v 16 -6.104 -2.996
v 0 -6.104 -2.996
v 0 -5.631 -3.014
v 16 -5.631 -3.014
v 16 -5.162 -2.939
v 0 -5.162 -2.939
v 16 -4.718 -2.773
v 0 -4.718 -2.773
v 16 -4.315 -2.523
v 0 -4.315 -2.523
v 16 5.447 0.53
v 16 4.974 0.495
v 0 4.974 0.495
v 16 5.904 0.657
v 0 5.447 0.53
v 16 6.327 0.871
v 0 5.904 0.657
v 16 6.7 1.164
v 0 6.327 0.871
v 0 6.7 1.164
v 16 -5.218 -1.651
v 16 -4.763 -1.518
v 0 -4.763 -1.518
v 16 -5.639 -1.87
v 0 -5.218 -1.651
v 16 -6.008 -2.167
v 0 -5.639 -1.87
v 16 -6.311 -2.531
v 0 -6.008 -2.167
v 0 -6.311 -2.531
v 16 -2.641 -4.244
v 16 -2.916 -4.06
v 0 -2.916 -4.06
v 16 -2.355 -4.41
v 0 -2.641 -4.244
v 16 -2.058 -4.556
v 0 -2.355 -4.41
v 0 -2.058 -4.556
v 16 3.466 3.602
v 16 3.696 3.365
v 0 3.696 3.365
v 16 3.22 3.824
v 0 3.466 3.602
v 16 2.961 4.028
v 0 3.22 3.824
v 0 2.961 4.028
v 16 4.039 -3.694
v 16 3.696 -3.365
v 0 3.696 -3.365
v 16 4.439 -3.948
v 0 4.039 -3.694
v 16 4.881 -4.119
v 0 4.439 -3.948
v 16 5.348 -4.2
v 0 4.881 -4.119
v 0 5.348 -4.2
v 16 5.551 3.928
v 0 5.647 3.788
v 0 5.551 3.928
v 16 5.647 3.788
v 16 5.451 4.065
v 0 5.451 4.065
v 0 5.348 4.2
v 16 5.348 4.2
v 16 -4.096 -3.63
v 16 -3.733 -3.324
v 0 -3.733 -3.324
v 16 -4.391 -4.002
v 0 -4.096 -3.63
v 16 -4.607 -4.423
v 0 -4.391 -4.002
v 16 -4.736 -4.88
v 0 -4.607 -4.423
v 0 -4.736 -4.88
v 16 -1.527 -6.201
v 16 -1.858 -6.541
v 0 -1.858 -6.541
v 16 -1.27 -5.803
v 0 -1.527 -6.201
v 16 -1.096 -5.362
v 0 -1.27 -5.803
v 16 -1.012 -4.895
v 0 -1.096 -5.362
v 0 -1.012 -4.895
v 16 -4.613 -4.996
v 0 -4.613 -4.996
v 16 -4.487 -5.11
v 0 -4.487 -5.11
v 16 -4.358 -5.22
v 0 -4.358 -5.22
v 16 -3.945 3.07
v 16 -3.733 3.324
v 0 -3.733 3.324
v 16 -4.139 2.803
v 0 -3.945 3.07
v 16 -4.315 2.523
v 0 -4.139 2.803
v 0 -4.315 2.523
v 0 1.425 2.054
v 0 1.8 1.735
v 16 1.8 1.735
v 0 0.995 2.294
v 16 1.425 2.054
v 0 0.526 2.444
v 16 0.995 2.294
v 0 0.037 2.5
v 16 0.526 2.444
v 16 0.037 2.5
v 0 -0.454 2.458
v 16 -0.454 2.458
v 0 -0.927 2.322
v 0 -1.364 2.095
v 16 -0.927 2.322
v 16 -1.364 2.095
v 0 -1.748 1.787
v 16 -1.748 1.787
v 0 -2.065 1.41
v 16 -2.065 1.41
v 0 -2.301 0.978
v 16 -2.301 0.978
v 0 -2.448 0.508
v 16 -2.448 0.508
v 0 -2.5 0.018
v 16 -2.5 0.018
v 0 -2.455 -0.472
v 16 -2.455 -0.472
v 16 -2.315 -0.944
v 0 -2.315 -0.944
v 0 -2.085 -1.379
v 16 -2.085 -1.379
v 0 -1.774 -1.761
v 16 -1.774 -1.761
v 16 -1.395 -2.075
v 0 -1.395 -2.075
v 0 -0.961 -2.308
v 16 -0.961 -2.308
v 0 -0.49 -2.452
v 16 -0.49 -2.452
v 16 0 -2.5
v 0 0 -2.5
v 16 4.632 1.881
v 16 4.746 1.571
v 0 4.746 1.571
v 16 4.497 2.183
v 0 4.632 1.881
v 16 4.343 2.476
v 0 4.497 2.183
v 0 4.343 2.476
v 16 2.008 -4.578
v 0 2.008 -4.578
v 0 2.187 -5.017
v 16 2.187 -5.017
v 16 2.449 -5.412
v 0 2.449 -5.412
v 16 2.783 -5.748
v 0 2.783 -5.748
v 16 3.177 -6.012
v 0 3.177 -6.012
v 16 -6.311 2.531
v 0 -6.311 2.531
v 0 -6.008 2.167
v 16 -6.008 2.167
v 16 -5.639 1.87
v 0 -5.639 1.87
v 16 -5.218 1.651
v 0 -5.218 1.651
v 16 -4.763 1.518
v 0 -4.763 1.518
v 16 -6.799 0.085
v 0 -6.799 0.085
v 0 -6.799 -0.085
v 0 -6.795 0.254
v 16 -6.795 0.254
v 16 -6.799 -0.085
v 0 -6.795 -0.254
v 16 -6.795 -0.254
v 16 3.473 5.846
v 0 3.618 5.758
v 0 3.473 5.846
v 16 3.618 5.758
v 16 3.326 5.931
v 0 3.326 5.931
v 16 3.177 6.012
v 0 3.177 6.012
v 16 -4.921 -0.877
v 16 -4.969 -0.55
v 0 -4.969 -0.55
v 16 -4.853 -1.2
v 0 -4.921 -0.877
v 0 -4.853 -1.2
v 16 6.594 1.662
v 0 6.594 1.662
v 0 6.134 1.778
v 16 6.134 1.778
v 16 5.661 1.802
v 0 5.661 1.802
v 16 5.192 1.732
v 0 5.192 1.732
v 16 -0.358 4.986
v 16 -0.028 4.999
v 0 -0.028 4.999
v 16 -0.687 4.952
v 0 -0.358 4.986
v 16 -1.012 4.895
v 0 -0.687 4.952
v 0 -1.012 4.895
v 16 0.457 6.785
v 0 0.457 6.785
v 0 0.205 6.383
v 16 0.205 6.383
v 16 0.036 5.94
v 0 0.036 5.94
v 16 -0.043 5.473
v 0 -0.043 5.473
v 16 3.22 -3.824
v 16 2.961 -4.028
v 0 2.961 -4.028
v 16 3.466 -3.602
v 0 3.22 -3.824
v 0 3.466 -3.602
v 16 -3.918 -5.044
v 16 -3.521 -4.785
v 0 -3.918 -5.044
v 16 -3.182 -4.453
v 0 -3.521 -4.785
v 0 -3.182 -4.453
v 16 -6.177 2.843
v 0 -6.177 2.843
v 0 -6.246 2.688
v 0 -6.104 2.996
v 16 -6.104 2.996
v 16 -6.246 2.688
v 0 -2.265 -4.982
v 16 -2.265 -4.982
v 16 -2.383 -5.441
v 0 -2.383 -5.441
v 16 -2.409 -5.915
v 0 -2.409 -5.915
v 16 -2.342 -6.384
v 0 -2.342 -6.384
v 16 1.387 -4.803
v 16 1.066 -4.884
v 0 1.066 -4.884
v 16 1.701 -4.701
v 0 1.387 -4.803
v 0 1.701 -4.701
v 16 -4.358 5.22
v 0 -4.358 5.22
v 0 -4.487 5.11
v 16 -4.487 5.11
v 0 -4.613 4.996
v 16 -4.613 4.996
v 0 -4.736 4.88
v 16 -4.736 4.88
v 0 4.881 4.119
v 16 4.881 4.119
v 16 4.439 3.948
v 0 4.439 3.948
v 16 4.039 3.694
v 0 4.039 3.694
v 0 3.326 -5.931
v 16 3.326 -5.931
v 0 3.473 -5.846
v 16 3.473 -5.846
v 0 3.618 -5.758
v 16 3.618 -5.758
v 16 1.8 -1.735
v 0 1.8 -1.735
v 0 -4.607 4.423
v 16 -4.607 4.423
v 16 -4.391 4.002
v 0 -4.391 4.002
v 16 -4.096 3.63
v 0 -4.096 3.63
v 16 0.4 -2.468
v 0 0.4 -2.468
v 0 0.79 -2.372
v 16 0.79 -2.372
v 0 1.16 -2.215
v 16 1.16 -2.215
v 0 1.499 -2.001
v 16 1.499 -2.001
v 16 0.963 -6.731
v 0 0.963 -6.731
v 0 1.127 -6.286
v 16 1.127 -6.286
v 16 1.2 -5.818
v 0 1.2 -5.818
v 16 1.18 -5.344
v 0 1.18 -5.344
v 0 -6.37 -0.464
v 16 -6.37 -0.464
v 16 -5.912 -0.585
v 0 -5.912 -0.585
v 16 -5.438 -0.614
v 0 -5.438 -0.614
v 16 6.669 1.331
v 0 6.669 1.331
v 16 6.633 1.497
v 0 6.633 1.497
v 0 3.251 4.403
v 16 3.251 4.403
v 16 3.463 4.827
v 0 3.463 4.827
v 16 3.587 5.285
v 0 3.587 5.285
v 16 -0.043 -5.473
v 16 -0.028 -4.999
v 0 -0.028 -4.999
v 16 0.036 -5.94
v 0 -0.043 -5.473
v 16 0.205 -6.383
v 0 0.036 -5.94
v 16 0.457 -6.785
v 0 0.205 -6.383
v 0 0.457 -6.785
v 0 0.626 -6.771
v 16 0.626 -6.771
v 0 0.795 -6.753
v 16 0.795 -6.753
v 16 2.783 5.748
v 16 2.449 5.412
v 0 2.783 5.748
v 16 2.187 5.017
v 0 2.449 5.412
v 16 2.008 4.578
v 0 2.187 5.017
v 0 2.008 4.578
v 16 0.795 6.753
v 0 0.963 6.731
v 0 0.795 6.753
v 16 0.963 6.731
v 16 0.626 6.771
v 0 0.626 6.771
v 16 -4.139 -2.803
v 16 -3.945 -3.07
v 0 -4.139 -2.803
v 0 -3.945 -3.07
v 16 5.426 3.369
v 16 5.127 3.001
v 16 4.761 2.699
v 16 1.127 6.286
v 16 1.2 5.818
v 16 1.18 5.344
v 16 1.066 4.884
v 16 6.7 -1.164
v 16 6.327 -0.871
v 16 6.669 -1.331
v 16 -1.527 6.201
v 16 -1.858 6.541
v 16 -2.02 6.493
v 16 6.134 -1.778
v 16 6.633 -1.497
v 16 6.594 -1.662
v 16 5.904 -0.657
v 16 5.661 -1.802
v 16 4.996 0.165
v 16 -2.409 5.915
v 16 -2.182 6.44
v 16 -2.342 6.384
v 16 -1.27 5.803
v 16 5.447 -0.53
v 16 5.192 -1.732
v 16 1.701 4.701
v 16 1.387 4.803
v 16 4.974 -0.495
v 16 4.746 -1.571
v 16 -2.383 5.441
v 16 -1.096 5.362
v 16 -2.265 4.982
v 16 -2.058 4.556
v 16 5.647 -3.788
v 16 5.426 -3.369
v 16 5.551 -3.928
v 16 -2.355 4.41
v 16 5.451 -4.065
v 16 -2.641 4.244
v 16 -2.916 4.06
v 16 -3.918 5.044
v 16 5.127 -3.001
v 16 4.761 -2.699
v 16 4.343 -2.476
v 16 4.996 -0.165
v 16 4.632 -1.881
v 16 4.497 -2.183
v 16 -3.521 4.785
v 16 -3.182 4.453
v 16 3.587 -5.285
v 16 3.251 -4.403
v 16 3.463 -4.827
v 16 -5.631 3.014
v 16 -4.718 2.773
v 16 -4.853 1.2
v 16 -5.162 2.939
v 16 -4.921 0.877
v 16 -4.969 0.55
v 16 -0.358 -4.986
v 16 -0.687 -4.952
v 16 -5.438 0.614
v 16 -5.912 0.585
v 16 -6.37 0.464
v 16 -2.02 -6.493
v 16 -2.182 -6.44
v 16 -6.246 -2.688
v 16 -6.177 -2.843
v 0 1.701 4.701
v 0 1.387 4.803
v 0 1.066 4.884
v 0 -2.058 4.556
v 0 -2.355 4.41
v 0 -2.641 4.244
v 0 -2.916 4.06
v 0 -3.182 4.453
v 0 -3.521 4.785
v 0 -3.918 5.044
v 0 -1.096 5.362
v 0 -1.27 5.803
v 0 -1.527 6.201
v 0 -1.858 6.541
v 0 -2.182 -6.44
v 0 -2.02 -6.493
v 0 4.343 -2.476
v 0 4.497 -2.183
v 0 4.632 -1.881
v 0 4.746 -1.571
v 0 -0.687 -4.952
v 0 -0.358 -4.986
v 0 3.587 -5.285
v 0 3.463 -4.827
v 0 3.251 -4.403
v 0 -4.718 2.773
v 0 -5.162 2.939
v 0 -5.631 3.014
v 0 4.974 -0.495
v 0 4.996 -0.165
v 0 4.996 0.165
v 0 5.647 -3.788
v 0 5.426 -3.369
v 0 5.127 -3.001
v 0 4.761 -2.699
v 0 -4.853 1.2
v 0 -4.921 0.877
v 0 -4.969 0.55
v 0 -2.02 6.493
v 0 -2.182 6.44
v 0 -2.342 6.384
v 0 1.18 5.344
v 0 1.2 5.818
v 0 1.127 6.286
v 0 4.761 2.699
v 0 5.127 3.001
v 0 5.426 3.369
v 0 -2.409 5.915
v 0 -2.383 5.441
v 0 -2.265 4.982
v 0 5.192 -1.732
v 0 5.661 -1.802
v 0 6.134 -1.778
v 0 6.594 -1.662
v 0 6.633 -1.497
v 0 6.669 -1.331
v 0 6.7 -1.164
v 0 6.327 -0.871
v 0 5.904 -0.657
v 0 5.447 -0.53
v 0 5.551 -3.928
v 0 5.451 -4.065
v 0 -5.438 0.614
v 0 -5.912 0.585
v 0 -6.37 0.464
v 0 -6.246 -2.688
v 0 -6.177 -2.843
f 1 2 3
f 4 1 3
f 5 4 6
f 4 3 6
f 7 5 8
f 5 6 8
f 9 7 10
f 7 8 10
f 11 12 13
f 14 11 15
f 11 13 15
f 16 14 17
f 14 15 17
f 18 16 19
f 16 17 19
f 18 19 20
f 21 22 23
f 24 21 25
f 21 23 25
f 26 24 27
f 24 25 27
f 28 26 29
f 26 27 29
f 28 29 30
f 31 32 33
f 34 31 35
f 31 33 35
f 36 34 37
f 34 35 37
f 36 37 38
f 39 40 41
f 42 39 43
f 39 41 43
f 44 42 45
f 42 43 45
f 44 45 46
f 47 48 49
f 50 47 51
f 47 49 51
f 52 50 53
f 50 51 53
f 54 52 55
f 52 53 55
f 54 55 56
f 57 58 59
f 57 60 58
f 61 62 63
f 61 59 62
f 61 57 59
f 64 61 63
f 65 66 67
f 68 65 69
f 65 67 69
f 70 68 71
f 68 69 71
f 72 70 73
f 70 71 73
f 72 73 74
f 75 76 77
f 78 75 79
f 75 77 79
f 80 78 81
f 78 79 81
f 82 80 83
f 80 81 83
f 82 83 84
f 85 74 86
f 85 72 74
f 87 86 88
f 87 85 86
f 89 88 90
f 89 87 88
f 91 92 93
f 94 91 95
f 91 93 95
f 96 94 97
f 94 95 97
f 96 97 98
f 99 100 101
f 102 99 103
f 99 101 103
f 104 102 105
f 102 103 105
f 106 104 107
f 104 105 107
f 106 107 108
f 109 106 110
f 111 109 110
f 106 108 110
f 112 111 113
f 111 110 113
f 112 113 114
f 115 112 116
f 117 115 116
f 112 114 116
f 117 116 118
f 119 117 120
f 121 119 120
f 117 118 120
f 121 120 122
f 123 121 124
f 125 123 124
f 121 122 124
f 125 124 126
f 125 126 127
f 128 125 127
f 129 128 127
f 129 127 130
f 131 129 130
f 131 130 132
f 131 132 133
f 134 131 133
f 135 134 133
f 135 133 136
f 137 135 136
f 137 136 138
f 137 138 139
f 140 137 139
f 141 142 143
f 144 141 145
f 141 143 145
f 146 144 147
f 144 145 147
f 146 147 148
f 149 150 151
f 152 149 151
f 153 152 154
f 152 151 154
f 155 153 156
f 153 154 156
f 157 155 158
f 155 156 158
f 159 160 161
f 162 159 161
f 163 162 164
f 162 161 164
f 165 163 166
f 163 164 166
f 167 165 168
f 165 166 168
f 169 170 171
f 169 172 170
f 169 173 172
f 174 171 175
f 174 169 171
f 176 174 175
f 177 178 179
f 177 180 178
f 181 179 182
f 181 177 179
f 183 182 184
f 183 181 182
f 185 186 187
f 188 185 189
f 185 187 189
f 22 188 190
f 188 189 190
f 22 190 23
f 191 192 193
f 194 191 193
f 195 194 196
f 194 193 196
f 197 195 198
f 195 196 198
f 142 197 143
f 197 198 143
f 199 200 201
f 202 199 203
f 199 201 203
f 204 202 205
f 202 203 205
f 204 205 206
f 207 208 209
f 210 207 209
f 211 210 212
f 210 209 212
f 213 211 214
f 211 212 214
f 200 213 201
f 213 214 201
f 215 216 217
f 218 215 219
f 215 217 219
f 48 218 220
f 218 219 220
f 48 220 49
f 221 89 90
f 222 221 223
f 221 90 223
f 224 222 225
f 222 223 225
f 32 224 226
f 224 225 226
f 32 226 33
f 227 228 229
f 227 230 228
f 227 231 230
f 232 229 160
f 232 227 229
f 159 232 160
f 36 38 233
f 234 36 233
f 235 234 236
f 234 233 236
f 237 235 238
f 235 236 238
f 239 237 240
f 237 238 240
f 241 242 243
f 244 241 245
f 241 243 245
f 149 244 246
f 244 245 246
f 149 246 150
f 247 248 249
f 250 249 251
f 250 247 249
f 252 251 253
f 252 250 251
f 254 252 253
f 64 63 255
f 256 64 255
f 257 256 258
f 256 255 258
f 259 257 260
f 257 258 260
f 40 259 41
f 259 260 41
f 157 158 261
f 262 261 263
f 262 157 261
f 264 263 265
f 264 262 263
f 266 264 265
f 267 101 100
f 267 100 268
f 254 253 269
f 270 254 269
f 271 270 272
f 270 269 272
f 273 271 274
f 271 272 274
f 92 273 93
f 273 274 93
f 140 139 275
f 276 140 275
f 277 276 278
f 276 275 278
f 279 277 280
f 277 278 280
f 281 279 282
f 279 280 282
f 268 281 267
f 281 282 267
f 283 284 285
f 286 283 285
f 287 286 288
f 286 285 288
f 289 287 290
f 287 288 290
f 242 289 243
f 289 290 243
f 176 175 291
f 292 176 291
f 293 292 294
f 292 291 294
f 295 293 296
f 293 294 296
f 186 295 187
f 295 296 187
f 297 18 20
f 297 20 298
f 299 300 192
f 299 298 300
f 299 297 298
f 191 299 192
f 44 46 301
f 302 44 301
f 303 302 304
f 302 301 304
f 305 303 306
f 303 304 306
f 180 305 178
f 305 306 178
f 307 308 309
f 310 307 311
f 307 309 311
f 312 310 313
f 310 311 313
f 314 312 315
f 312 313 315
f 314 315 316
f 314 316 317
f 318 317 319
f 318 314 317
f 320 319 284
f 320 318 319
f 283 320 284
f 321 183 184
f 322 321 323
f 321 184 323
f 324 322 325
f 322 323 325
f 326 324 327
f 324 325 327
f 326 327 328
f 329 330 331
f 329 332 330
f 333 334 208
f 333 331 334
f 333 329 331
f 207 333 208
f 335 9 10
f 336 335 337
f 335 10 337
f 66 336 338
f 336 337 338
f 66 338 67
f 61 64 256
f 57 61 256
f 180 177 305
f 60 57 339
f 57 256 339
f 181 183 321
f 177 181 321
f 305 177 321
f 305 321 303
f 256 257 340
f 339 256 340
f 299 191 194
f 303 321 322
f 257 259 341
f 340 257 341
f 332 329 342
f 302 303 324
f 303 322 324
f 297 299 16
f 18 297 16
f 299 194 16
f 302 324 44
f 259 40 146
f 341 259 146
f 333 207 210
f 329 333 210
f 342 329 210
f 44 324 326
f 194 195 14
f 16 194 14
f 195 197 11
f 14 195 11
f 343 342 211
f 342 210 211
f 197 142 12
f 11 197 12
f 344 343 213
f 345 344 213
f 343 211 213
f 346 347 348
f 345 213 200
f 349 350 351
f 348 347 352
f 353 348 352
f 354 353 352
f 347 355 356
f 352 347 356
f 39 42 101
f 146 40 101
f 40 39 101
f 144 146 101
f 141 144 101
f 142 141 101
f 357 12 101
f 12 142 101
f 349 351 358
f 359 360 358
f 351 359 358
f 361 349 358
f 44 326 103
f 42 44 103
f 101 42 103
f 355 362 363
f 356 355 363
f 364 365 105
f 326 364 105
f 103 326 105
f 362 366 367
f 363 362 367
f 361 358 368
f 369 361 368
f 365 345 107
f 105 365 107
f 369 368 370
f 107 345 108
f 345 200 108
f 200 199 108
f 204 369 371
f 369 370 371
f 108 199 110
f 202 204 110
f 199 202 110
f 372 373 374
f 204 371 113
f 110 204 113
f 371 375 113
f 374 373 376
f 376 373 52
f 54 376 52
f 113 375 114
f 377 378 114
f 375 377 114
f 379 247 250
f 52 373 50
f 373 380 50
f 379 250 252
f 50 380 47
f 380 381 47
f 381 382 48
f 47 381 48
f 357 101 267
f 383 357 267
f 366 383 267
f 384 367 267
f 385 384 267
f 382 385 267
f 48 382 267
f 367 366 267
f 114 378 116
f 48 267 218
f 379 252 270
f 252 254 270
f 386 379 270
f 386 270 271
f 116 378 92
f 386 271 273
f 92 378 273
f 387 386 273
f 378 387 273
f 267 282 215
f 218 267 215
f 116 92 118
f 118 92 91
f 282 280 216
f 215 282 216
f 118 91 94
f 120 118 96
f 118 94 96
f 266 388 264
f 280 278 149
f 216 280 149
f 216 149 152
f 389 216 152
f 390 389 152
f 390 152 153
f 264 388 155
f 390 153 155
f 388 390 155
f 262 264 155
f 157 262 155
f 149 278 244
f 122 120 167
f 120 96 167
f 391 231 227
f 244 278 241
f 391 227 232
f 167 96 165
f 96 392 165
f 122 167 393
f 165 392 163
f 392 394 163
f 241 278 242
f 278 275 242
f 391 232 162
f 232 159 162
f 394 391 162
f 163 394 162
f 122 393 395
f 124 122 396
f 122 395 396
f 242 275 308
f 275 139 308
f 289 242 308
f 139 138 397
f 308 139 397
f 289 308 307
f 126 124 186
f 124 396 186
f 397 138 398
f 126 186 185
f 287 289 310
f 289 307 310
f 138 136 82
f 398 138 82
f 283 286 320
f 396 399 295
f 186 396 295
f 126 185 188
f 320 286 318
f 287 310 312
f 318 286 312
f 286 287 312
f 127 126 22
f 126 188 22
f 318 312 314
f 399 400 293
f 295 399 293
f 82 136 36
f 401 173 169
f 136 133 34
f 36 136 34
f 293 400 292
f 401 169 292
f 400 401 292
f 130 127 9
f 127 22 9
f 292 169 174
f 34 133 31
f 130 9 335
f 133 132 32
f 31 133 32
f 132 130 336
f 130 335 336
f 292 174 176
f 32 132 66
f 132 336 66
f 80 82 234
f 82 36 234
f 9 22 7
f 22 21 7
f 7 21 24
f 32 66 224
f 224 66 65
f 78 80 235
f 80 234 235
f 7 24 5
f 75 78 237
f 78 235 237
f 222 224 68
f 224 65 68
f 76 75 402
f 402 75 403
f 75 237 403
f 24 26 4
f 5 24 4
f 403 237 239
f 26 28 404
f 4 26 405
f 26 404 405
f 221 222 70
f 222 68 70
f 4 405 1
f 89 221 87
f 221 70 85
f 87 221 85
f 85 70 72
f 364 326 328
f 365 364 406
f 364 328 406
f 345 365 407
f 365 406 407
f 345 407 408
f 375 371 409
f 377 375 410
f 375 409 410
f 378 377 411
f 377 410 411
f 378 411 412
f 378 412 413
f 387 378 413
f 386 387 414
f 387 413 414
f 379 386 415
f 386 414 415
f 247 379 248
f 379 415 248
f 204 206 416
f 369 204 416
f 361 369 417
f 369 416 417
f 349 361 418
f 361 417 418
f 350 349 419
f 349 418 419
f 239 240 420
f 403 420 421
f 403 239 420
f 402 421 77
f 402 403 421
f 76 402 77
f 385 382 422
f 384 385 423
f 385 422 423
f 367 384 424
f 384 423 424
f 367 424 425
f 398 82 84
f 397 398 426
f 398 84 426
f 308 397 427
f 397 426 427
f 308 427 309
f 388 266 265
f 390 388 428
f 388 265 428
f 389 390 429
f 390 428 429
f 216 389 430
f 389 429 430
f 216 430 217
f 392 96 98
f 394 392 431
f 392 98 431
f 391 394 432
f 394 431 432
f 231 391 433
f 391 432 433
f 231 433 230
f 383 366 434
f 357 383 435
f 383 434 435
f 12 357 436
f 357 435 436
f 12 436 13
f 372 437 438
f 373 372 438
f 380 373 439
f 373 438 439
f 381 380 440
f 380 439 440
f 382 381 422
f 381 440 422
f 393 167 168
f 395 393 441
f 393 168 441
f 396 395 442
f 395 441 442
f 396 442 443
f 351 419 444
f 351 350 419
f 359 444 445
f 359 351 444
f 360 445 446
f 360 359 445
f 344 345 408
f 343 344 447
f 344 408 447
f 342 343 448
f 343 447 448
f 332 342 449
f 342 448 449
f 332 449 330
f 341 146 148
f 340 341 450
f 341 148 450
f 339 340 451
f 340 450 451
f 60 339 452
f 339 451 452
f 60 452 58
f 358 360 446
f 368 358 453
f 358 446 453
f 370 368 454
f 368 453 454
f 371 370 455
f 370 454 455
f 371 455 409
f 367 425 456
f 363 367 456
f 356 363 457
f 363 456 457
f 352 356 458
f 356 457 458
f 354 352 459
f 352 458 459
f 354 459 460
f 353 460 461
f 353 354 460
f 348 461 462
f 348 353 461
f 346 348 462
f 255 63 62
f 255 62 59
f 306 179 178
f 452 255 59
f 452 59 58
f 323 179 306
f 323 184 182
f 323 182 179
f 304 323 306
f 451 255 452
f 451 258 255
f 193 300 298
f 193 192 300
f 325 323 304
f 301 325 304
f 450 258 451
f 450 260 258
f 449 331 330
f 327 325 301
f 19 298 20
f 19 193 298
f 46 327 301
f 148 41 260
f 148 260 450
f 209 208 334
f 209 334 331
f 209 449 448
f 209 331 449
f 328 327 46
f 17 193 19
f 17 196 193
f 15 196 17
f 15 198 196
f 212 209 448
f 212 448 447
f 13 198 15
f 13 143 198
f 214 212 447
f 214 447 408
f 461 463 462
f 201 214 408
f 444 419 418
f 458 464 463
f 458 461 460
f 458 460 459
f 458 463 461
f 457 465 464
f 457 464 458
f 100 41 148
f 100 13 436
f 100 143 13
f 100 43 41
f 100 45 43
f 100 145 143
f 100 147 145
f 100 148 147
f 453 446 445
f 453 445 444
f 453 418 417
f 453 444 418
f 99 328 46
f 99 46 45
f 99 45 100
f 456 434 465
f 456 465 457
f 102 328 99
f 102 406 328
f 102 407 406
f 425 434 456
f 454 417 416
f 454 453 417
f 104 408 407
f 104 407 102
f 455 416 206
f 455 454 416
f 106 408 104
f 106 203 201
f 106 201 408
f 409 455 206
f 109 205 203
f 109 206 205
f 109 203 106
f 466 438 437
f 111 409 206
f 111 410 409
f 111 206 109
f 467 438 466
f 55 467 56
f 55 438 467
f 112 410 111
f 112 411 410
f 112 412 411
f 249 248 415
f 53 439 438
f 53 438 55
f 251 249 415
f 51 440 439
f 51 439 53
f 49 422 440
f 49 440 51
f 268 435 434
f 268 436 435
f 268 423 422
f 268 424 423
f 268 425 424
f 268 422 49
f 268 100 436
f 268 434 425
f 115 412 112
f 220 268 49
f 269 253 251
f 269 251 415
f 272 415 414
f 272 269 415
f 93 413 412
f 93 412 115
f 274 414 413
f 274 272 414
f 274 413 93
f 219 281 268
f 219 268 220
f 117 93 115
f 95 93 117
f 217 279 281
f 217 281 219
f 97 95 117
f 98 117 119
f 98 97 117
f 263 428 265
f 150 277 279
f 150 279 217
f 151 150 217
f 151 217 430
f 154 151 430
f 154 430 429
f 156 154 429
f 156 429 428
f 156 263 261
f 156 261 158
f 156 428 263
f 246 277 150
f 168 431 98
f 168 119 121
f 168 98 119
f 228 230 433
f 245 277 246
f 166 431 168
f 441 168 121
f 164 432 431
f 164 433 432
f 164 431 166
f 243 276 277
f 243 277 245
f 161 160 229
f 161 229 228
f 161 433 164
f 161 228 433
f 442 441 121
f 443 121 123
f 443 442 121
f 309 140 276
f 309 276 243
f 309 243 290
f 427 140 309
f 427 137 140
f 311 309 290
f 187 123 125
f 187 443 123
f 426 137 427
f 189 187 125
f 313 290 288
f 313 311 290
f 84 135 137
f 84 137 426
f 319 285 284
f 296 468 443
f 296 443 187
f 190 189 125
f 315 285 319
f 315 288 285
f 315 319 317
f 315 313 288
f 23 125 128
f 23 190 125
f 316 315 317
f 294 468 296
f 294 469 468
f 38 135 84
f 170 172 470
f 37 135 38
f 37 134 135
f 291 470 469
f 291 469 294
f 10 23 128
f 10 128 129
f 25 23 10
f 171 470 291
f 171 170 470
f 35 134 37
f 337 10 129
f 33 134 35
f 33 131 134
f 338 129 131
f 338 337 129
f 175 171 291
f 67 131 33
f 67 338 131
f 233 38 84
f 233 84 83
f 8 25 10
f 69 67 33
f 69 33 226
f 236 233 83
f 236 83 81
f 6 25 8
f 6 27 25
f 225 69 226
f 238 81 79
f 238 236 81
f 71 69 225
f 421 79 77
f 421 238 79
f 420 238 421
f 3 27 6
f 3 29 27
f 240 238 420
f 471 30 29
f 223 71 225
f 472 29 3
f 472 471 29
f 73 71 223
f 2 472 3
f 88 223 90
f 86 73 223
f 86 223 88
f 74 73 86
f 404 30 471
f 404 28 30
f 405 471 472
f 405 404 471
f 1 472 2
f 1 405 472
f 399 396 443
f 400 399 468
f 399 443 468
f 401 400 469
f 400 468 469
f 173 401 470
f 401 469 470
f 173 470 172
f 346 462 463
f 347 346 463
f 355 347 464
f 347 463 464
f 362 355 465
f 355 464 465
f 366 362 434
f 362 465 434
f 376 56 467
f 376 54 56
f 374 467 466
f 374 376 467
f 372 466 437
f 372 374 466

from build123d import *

# Parameters (mm, degrees)
BASPROSKE_W         = 16
BASPROSKE_H         = 6.8
TOOTHCUT_DEPTH      = 19.667619023
TEETHCUTS_COUNT     = 15
TEETHCUTS_ANGLE     = 336
BORSKE_R            = 2
BORE_DEPTH          = 50.000508
BOSS_EXTRUDE1_DEPTH = 16
CUT_EXTRUDE1_DEPTH  = 19.662017839


with BuildPart() as part:
    # BasProSke → Base-Revolve (revolve)
    with BuildSketch(Plane(origin=(0, 0, 0), x_dir=(1, 0, 0), z_dir=(0, 1, 0)), mode=Mode.PRIVATE) as base_revolve_sk:
        with Locations((8, 3.4)):
            Rectangle(BASPROSKE_W, BASPROSKE_H)
    revolve(base_revolve_sk.sketch.rotate(Axis((-10, 0, 0), (1, 0, 0)), 180), axis=Axis((-10, 0, 0), (1, 0, 0)))

    # TooCutSke → ToothCut (cut, through all)
    with BuildSketch(Plane(origin=(0, 0, 0), x_dir=(0, 0, -1), z_dir=(1, 0, 0))):
        with BuildLine():
            ThreePointArc((0.495059869, 4.974426271), (0, 4.999), (-0.495059869, 4.974426271))
            ThreePointArc((-0.495059869, 4.974426271), (-0.662158854, 5.91840511), (-1.185392978, 6.72167603))
            ThreePointArc((-1.185392978, 6.72167603), (0, 6.8254), (1.185392978, 6.72167603))
            ThreePointArc((1.185392978, 6.72167603), (0.662158854, 5.91840511), (0.495059869, 4.974426271))
        make_face()
    toothcut = extrude(amount=TOOTHCUT_DEPTH, mode=Mode.SUBTRACT)

    # TeethCuts: ToothCut ×15 about axis
    teethcuts_axis = Axis((-10, 0, 0), (1, 0, 0))
    for i in range(1, TEETHCUTS_COUNT):
        add(toothcut.rotate(teethcuts_axis, i * TEETHCUTS_ANGLE / (TEETHCUTS_COUNT - 1)), mode=Mode.SUBTRACT)

    # BorSke → Bore (cut, symmetric)
    with BuildSketch(Plane(origin=(0, 0, 0), x_dir=(0, 0, -1), z_dir=(1, 0, 0))):
        with Locations(Location((0, 0, 0), (0, 0, 180))):
            Circle(BORSKE_R)
    extrude(amount=BORE_DEPTH, both=True, mode=Mode.SUBTRACT)

    # Sketch1 → Boss-Extrude1 (add, through all)
    with BuildSketch(Plane(origin=(16, 0, 0), x_dir=(0, 0, -1), z_dir=(1, 0, 0))):
        with BuildLine():
            Line((-0.871779789, 1.8), (0.871779789, 1.8))
            ThreePointArc((0.871779789, 1.8), (0, 2), (-0.871779789, 1.8))
        make_face()
    extrude(amount=-BOSS_EXTRUDE1_DEPTH)

    # Sketch1<3> → Cut-Extrude1 (cut, through all)
    with BuildSketch(Plane(origin=(16, 0, 0), x_dir=(0, 0, -1), z_dir=(1, 0, 0))):
        with BuildLine():
            ThreePointArc((2.5, 0), (2.300797459, 0.977921803), (1.734935157, 1.8))
            Line((1.734935157, 1.8), (-1.734935157, 1.8))
            ThreePointArc((-1.734935157, 1.8), (-0.977921803, -2.300797459), (2.5, 0))
        make_face()
    extrude(amount=-CUT_EXTRUDE1_DEPTH, mode=Mode.SUBTRACT)


solid = part.part
